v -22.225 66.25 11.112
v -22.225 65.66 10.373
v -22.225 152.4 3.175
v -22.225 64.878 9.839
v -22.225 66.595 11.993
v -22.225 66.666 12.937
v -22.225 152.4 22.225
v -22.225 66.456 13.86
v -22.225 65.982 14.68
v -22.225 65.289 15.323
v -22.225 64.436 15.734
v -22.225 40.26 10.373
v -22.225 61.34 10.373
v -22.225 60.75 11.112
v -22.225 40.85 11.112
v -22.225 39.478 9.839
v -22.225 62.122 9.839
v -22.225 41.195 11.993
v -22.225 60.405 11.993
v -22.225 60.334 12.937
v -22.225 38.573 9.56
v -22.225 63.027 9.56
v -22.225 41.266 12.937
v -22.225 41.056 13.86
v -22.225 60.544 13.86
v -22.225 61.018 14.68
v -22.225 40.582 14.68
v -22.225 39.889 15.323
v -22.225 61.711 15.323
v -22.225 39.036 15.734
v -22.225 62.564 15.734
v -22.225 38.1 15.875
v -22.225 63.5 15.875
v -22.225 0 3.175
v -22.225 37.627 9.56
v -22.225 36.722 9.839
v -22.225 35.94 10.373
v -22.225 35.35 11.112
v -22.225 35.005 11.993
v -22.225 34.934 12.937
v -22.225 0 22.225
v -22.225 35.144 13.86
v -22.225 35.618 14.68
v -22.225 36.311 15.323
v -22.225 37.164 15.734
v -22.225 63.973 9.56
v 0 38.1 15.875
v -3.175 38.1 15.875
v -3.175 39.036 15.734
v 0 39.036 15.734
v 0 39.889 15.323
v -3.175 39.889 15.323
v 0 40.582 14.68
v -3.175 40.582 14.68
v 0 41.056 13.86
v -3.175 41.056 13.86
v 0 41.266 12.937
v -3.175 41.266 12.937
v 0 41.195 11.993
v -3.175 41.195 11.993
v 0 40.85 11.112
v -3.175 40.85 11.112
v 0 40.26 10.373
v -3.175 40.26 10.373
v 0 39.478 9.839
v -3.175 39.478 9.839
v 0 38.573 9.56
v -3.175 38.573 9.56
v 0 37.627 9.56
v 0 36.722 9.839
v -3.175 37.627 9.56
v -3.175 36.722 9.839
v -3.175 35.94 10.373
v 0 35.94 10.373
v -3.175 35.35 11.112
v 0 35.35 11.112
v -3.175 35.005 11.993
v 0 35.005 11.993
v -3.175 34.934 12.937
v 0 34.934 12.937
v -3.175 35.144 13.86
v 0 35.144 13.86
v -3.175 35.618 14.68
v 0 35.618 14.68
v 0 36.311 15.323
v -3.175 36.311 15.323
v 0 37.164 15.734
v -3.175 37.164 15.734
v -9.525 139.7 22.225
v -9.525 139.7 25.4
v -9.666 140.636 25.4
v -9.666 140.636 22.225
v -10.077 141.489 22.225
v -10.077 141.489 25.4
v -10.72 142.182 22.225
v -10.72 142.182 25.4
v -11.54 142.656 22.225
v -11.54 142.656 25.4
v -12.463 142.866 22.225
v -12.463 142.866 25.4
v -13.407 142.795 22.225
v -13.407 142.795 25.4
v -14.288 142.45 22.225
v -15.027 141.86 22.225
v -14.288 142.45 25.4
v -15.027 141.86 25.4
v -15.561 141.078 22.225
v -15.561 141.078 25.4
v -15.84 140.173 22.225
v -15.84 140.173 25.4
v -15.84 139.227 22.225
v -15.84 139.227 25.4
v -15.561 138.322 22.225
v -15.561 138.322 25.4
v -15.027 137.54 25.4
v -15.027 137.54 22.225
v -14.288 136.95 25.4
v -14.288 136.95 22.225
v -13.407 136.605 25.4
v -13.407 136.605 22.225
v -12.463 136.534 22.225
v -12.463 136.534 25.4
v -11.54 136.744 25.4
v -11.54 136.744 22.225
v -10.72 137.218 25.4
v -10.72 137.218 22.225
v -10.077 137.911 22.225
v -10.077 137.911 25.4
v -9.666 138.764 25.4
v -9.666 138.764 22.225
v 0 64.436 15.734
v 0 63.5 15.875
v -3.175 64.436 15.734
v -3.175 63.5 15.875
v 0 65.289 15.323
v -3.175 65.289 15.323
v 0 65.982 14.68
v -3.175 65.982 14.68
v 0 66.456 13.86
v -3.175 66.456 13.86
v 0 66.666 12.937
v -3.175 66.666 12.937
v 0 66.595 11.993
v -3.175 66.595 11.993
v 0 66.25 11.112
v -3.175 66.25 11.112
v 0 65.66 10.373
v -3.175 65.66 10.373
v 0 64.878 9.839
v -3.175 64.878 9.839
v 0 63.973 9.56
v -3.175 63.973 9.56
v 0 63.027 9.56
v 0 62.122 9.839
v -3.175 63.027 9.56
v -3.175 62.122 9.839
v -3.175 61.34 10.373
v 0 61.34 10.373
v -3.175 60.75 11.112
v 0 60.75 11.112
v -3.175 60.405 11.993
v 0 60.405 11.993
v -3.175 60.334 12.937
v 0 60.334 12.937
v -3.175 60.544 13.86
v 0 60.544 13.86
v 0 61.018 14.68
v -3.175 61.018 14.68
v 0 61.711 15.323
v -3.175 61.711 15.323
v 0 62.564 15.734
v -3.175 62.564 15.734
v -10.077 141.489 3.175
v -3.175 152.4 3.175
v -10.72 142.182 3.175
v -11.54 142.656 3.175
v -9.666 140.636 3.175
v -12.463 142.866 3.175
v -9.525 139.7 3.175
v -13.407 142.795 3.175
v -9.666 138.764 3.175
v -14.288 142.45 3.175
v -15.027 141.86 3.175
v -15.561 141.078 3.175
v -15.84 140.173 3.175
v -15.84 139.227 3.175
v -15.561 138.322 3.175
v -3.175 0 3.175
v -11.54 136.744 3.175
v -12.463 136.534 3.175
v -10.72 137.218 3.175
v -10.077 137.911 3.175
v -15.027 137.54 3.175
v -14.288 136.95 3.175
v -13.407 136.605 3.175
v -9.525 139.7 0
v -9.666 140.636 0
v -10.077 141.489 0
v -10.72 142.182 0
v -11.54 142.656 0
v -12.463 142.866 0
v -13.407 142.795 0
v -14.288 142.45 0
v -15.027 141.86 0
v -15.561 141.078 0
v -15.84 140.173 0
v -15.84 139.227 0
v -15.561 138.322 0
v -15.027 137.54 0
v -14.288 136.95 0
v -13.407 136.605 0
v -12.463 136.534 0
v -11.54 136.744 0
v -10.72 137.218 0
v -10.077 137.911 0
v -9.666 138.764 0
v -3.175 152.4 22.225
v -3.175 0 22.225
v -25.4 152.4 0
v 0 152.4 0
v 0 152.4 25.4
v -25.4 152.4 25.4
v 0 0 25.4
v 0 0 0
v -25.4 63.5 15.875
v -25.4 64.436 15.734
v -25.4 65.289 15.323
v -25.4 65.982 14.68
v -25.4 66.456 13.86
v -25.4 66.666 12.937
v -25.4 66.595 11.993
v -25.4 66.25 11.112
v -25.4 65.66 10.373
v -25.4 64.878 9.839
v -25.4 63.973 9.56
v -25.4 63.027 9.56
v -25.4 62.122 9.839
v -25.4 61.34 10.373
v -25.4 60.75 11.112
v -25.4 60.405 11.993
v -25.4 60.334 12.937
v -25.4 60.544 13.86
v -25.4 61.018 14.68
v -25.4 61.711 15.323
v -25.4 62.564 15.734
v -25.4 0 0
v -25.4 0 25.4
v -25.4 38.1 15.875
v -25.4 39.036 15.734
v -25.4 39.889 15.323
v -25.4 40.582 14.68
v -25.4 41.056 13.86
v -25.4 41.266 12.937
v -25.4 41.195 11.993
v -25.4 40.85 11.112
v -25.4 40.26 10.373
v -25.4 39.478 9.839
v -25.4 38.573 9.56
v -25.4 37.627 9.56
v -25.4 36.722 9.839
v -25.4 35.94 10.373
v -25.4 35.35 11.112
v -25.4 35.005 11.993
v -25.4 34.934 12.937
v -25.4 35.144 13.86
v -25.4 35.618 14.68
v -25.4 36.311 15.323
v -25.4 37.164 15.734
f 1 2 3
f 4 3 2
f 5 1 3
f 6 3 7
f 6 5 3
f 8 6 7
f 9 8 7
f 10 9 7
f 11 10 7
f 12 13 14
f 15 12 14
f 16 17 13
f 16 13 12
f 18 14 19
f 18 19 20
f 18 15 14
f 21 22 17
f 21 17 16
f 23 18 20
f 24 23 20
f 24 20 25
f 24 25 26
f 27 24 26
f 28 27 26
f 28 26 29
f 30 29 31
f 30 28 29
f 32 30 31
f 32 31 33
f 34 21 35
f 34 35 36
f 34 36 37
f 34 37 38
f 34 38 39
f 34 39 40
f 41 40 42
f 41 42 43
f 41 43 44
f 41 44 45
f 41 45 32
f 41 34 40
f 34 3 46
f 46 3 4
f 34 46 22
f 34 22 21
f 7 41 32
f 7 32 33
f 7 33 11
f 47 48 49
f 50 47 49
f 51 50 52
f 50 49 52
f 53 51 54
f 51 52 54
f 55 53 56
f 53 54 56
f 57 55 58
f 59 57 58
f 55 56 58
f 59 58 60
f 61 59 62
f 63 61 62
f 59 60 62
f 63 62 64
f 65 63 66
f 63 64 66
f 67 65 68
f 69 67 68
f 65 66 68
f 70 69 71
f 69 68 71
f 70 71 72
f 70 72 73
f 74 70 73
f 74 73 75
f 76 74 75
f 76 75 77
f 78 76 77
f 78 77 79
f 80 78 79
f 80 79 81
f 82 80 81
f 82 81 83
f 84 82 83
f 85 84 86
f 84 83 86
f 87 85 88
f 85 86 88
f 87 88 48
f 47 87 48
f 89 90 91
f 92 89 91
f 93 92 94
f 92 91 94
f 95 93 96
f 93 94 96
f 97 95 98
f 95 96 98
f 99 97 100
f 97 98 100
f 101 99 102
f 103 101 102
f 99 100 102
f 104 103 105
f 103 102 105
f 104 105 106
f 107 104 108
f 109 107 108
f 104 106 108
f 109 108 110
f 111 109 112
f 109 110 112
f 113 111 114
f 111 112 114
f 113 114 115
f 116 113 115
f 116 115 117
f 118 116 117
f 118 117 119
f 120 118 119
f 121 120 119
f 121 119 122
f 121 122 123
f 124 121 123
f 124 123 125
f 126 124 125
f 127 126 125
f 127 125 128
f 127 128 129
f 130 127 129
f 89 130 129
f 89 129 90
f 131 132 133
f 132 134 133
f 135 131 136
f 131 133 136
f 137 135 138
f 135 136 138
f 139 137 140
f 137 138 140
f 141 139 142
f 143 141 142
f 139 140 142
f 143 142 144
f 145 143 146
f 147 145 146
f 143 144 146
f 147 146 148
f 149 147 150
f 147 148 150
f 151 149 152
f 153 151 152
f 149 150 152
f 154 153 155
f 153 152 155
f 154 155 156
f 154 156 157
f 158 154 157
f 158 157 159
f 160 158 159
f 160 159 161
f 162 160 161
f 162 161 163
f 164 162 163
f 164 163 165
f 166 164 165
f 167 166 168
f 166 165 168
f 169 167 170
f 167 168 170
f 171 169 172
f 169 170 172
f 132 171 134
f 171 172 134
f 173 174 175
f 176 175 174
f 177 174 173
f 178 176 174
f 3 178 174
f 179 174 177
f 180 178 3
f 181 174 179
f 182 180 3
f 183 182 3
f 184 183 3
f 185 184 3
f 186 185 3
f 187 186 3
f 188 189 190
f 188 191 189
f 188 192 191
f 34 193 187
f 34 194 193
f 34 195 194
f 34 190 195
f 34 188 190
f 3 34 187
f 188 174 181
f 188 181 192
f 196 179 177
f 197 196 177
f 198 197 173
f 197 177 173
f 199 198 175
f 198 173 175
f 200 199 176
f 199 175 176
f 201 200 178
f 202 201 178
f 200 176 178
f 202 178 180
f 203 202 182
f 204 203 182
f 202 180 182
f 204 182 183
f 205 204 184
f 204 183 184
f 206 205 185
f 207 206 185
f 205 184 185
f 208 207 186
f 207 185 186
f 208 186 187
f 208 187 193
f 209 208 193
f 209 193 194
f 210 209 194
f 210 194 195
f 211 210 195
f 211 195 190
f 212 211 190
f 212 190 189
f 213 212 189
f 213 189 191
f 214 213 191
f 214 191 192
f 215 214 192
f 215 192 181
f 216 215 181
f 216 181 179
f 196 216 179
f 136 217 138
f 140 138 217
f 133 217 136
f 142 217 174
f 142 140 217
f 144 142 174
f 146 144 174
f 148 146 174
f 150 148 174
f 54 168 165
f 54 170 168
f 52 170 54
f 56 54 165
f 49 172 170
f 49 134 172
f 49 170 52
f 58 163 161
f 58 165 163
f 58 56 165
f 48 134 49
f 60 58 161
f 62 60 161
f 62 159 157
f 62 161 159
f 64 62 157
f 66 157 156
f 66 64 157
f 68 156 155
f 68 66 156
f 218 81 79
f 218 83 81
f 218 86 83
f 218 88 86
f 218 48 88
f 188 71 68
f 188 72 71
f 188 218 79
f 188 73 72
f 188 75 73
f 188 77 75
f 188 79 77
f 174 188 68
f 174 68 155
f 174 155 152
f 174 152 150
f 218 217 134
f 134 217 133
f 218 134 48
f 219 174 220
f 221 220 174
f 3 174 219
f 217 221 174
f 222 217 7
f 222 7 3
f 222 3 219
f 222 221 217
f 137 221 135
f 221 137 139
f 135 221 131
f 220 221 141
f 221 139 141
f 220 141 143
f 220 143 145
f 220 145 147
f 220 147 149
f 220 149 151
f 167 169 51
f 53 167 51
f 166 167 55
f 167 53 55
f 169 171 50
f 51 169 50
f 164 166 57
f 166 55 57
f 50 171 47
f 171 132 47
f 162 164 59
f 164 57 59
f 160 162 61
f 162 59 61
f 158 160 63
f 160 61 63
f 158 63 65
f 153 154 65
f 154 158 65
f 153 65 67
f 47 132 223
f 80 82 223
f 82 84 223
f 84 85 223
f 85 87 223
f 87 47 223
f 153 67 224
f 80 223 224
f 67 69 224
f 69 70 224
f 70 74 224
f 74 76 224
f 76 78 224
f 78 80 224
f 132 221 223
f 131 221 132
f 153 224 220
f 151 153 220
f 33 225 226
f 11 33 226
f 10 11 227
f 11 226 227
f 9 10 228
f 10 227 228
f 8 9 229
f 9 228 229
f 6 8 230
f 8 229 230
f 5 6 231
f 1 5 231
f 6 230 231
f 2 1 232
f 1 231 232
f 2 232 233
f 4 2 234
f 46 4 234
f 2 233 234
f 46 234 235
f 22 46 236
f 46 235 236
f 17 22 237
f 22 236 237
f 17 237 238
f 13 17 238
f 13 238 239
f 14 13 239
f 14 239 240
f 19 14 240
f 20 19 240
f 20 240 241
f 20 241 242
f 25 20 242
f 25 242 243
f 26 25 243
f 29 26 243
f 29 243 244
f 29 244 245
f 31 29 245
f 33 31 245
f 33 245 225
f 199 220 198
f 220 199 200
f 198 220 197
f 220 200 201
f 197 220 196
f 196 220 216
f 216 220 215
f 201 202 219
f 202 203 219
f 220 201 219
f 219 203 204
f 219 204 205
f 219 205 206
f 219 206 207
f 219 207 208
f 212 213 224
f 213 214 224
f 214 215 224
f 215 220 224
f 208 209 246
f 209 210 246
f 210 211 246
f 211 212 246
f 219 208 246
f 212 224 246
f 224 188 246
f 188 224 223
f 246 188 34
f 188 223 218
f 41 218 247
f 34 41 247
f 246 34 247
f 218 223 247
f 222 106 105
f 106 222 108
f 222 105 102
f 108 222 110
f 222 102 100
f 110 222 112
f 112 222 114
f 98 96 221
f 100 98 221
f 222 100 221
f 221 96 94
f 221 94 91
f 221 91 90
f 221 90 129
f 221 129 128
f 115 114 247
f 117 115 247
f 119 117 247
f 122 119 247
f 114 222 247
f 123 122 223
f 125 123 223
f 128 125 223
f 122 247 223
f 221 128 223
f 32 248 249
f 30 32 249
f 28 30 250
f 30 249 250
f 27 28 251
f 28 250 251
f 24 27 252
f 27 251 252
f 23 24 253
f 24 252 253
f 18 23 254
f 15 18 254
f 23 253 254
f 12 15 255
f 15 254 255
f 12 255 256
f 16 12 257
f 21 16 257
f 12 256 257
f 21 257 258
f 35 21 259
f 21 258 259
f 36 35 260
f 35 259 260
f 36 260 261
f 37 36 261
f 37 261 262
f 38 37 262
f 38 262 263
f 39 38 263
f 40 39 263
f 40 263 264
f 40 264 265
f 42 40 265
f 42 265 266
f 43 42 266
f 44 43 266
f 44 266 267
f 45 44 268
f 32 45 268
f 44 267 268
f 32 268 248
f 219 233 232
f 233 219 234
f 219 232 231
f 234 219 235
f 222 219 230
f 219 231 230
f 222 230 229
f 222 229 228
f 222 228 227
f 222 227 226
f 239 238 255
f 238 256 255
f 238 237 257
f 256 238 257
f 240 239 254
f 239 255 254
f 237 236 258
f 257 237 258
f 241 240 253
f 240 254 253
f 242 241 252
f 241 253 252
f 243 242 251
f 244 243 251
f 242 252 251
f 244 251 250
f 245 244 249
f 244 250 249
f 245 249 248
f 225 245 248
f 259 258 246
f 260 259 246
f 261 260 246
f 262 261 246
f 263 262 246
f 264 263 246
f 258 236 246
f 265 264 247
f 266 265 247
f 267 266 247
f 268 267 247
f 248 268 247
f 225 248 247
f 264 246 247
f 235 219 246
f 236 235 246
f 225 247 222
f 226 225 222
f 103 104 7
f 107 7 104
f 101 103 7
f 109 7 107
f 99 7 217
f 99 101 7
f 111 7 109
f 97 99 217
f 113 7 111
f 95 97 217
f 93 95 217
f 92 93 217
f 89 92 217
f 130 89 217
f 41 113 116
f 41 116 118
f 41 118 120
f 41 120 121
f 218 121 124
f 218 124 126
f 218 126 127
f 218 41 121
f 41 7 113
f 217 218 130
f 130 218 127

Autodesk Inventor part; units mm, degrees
ref_plane "YZ Plane" through (0, 0, 0) normal (1, 0, 0) x (0, 1, 0)
ref_plane "XZ Plane" through (0, 0, 0) normal (0, 1, 0) x (-1, 0, 0)
ref_plane "XY Plane" through (0, 0, 0) normal (0, 0, 1) x (1, 0, 0)
sketch "Sketch1" plane through (0, 0, 0) normal (0, 1, 0) x (-1, 0, 0)
  line L0 (0, 0) -> (25.4, 0)
  line L1 (25.4, 0) -> (25.4, 25.4)
  line L2 (25.4, 25.4) -> (0, 25.4)
  line L3 (0, 25.4) -> (0, 0)
  line L4 (22.225, 22.225) -> (3.175, 22.225)
  line L5 (3.175, 22.225) -> (3.175, 3.175)
  line L6 (3.175, 3.175) -> (22.225, 3.175)
  line L7 (22.225, 3.175) -> (22.225, 22.225)
  dimension "d0" = 25.4
  dimension "d1" = 25.4
  dimension "d4" = 3.175
  dimension "d5" = 3.175
  dimension "d7" = 3.175
  dimension "d8" = 3.175
extrude "Extrusion1" add sketch "Sketch1" along normal blind 152.4
sketch "Sketch2" plane through (-25.4, 0, 25.4) normal (0, 0, 1) x (1, 0, 0)
  circle A0 centre (12.7, 139.7) radius 3.175
  line L0 (0, 152.4) -> (25.4, 152.4) projected
  line L1 (0, 0) -> (0, 152.4) projected
  point P0 (25.4, 0)
  dimension "d11" = 6.35
  dimension "d12" = 12.7
  dimension "d13" = 12.7
extrude "Extrusion2" cut sketch "Sketch2" against normal through all
sketch "Sketch5" plane through (-25.4, 0, 0) normal (-1, 0, 0) x (0, 0, 1)
  circle A0 centre (12.7, 38.1) radius 3.175
  circle A1 centre (12.7, 63.5) radius 3.175
  line L0 (0, 0) -> (25.4, 0) projected
  line L1 (0, 0) -> (0, 152.4) projected
  dimension "d32" = 38.1
  dimension "d33" = 25.4
  dimension "d34" = 12.7
  dimension "d35" = 12.7
  dimension "d36" = 6.35
  dimension "d37" = 6.35
extrude "Extrusion5" cut sketch "Sketch5" against normal blind 25.4
properties part number "15102898-16-P-0505" material "Aluminum 6061"
